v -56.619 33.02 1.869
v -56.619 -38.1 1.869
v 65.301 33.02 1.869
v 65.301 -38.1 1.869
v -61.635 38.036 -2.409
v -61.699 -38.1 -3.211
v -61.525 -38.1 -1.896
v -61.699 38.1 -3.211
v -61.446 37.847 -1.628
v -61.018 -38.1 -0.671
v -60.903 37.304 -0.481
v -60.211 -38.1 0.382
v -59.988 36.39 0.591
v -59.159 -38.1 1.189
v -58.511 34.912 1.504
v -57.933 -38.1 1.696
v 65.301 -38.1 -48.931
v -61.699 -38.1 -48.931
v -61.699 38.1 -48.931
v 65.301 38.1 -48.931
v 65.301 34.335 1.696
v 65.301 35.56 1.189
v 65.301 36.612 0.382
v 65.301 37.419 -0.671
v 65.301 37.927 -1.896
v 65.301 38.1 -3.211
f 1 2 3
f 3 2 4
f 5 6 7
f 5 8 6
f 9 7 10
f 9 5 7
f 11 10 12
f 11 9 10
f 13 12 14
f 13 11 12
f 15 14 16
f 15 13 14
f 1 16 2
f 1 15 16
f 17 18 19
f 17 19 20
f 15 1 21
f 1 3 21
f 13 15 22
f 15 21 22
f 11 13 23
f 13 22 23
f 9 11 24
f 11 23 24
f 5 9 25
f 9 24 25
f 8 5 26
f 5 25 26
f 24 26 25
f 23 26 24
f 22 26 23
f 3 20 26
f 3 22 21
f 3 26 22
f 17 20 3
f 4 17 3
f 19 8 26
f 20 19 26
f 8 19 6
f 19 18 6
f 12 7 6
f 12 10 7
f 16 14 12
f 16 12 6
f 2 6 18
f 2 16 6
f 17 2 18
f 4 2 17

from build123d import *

# Parameters (mm, degrees)
F0_W     = 127
F0_H     = 50.8
F1_DEPTH = 38.1
F2_R     = 5.08


with BuildPart() as f1:
    # F0 (on Front) → F1 (new body, symmetric)
    with BuildSketch(Plane.XZ):
        with Locations((1.801427, -23.53057)):
            Rectangle(F0_W, F0_H)
    extrude(amount=F1_DEPTH, both=True)

    # F2
    f2_edges = [f1.edges().sort_by_distance(p)[0] for p in [
        (1.801427, 38.1, 1.86943),
        (-61.698573, 0, 1.86943),
    ]]
    fillet(f2_edges, radius=F2_R)


solid = f1.part
